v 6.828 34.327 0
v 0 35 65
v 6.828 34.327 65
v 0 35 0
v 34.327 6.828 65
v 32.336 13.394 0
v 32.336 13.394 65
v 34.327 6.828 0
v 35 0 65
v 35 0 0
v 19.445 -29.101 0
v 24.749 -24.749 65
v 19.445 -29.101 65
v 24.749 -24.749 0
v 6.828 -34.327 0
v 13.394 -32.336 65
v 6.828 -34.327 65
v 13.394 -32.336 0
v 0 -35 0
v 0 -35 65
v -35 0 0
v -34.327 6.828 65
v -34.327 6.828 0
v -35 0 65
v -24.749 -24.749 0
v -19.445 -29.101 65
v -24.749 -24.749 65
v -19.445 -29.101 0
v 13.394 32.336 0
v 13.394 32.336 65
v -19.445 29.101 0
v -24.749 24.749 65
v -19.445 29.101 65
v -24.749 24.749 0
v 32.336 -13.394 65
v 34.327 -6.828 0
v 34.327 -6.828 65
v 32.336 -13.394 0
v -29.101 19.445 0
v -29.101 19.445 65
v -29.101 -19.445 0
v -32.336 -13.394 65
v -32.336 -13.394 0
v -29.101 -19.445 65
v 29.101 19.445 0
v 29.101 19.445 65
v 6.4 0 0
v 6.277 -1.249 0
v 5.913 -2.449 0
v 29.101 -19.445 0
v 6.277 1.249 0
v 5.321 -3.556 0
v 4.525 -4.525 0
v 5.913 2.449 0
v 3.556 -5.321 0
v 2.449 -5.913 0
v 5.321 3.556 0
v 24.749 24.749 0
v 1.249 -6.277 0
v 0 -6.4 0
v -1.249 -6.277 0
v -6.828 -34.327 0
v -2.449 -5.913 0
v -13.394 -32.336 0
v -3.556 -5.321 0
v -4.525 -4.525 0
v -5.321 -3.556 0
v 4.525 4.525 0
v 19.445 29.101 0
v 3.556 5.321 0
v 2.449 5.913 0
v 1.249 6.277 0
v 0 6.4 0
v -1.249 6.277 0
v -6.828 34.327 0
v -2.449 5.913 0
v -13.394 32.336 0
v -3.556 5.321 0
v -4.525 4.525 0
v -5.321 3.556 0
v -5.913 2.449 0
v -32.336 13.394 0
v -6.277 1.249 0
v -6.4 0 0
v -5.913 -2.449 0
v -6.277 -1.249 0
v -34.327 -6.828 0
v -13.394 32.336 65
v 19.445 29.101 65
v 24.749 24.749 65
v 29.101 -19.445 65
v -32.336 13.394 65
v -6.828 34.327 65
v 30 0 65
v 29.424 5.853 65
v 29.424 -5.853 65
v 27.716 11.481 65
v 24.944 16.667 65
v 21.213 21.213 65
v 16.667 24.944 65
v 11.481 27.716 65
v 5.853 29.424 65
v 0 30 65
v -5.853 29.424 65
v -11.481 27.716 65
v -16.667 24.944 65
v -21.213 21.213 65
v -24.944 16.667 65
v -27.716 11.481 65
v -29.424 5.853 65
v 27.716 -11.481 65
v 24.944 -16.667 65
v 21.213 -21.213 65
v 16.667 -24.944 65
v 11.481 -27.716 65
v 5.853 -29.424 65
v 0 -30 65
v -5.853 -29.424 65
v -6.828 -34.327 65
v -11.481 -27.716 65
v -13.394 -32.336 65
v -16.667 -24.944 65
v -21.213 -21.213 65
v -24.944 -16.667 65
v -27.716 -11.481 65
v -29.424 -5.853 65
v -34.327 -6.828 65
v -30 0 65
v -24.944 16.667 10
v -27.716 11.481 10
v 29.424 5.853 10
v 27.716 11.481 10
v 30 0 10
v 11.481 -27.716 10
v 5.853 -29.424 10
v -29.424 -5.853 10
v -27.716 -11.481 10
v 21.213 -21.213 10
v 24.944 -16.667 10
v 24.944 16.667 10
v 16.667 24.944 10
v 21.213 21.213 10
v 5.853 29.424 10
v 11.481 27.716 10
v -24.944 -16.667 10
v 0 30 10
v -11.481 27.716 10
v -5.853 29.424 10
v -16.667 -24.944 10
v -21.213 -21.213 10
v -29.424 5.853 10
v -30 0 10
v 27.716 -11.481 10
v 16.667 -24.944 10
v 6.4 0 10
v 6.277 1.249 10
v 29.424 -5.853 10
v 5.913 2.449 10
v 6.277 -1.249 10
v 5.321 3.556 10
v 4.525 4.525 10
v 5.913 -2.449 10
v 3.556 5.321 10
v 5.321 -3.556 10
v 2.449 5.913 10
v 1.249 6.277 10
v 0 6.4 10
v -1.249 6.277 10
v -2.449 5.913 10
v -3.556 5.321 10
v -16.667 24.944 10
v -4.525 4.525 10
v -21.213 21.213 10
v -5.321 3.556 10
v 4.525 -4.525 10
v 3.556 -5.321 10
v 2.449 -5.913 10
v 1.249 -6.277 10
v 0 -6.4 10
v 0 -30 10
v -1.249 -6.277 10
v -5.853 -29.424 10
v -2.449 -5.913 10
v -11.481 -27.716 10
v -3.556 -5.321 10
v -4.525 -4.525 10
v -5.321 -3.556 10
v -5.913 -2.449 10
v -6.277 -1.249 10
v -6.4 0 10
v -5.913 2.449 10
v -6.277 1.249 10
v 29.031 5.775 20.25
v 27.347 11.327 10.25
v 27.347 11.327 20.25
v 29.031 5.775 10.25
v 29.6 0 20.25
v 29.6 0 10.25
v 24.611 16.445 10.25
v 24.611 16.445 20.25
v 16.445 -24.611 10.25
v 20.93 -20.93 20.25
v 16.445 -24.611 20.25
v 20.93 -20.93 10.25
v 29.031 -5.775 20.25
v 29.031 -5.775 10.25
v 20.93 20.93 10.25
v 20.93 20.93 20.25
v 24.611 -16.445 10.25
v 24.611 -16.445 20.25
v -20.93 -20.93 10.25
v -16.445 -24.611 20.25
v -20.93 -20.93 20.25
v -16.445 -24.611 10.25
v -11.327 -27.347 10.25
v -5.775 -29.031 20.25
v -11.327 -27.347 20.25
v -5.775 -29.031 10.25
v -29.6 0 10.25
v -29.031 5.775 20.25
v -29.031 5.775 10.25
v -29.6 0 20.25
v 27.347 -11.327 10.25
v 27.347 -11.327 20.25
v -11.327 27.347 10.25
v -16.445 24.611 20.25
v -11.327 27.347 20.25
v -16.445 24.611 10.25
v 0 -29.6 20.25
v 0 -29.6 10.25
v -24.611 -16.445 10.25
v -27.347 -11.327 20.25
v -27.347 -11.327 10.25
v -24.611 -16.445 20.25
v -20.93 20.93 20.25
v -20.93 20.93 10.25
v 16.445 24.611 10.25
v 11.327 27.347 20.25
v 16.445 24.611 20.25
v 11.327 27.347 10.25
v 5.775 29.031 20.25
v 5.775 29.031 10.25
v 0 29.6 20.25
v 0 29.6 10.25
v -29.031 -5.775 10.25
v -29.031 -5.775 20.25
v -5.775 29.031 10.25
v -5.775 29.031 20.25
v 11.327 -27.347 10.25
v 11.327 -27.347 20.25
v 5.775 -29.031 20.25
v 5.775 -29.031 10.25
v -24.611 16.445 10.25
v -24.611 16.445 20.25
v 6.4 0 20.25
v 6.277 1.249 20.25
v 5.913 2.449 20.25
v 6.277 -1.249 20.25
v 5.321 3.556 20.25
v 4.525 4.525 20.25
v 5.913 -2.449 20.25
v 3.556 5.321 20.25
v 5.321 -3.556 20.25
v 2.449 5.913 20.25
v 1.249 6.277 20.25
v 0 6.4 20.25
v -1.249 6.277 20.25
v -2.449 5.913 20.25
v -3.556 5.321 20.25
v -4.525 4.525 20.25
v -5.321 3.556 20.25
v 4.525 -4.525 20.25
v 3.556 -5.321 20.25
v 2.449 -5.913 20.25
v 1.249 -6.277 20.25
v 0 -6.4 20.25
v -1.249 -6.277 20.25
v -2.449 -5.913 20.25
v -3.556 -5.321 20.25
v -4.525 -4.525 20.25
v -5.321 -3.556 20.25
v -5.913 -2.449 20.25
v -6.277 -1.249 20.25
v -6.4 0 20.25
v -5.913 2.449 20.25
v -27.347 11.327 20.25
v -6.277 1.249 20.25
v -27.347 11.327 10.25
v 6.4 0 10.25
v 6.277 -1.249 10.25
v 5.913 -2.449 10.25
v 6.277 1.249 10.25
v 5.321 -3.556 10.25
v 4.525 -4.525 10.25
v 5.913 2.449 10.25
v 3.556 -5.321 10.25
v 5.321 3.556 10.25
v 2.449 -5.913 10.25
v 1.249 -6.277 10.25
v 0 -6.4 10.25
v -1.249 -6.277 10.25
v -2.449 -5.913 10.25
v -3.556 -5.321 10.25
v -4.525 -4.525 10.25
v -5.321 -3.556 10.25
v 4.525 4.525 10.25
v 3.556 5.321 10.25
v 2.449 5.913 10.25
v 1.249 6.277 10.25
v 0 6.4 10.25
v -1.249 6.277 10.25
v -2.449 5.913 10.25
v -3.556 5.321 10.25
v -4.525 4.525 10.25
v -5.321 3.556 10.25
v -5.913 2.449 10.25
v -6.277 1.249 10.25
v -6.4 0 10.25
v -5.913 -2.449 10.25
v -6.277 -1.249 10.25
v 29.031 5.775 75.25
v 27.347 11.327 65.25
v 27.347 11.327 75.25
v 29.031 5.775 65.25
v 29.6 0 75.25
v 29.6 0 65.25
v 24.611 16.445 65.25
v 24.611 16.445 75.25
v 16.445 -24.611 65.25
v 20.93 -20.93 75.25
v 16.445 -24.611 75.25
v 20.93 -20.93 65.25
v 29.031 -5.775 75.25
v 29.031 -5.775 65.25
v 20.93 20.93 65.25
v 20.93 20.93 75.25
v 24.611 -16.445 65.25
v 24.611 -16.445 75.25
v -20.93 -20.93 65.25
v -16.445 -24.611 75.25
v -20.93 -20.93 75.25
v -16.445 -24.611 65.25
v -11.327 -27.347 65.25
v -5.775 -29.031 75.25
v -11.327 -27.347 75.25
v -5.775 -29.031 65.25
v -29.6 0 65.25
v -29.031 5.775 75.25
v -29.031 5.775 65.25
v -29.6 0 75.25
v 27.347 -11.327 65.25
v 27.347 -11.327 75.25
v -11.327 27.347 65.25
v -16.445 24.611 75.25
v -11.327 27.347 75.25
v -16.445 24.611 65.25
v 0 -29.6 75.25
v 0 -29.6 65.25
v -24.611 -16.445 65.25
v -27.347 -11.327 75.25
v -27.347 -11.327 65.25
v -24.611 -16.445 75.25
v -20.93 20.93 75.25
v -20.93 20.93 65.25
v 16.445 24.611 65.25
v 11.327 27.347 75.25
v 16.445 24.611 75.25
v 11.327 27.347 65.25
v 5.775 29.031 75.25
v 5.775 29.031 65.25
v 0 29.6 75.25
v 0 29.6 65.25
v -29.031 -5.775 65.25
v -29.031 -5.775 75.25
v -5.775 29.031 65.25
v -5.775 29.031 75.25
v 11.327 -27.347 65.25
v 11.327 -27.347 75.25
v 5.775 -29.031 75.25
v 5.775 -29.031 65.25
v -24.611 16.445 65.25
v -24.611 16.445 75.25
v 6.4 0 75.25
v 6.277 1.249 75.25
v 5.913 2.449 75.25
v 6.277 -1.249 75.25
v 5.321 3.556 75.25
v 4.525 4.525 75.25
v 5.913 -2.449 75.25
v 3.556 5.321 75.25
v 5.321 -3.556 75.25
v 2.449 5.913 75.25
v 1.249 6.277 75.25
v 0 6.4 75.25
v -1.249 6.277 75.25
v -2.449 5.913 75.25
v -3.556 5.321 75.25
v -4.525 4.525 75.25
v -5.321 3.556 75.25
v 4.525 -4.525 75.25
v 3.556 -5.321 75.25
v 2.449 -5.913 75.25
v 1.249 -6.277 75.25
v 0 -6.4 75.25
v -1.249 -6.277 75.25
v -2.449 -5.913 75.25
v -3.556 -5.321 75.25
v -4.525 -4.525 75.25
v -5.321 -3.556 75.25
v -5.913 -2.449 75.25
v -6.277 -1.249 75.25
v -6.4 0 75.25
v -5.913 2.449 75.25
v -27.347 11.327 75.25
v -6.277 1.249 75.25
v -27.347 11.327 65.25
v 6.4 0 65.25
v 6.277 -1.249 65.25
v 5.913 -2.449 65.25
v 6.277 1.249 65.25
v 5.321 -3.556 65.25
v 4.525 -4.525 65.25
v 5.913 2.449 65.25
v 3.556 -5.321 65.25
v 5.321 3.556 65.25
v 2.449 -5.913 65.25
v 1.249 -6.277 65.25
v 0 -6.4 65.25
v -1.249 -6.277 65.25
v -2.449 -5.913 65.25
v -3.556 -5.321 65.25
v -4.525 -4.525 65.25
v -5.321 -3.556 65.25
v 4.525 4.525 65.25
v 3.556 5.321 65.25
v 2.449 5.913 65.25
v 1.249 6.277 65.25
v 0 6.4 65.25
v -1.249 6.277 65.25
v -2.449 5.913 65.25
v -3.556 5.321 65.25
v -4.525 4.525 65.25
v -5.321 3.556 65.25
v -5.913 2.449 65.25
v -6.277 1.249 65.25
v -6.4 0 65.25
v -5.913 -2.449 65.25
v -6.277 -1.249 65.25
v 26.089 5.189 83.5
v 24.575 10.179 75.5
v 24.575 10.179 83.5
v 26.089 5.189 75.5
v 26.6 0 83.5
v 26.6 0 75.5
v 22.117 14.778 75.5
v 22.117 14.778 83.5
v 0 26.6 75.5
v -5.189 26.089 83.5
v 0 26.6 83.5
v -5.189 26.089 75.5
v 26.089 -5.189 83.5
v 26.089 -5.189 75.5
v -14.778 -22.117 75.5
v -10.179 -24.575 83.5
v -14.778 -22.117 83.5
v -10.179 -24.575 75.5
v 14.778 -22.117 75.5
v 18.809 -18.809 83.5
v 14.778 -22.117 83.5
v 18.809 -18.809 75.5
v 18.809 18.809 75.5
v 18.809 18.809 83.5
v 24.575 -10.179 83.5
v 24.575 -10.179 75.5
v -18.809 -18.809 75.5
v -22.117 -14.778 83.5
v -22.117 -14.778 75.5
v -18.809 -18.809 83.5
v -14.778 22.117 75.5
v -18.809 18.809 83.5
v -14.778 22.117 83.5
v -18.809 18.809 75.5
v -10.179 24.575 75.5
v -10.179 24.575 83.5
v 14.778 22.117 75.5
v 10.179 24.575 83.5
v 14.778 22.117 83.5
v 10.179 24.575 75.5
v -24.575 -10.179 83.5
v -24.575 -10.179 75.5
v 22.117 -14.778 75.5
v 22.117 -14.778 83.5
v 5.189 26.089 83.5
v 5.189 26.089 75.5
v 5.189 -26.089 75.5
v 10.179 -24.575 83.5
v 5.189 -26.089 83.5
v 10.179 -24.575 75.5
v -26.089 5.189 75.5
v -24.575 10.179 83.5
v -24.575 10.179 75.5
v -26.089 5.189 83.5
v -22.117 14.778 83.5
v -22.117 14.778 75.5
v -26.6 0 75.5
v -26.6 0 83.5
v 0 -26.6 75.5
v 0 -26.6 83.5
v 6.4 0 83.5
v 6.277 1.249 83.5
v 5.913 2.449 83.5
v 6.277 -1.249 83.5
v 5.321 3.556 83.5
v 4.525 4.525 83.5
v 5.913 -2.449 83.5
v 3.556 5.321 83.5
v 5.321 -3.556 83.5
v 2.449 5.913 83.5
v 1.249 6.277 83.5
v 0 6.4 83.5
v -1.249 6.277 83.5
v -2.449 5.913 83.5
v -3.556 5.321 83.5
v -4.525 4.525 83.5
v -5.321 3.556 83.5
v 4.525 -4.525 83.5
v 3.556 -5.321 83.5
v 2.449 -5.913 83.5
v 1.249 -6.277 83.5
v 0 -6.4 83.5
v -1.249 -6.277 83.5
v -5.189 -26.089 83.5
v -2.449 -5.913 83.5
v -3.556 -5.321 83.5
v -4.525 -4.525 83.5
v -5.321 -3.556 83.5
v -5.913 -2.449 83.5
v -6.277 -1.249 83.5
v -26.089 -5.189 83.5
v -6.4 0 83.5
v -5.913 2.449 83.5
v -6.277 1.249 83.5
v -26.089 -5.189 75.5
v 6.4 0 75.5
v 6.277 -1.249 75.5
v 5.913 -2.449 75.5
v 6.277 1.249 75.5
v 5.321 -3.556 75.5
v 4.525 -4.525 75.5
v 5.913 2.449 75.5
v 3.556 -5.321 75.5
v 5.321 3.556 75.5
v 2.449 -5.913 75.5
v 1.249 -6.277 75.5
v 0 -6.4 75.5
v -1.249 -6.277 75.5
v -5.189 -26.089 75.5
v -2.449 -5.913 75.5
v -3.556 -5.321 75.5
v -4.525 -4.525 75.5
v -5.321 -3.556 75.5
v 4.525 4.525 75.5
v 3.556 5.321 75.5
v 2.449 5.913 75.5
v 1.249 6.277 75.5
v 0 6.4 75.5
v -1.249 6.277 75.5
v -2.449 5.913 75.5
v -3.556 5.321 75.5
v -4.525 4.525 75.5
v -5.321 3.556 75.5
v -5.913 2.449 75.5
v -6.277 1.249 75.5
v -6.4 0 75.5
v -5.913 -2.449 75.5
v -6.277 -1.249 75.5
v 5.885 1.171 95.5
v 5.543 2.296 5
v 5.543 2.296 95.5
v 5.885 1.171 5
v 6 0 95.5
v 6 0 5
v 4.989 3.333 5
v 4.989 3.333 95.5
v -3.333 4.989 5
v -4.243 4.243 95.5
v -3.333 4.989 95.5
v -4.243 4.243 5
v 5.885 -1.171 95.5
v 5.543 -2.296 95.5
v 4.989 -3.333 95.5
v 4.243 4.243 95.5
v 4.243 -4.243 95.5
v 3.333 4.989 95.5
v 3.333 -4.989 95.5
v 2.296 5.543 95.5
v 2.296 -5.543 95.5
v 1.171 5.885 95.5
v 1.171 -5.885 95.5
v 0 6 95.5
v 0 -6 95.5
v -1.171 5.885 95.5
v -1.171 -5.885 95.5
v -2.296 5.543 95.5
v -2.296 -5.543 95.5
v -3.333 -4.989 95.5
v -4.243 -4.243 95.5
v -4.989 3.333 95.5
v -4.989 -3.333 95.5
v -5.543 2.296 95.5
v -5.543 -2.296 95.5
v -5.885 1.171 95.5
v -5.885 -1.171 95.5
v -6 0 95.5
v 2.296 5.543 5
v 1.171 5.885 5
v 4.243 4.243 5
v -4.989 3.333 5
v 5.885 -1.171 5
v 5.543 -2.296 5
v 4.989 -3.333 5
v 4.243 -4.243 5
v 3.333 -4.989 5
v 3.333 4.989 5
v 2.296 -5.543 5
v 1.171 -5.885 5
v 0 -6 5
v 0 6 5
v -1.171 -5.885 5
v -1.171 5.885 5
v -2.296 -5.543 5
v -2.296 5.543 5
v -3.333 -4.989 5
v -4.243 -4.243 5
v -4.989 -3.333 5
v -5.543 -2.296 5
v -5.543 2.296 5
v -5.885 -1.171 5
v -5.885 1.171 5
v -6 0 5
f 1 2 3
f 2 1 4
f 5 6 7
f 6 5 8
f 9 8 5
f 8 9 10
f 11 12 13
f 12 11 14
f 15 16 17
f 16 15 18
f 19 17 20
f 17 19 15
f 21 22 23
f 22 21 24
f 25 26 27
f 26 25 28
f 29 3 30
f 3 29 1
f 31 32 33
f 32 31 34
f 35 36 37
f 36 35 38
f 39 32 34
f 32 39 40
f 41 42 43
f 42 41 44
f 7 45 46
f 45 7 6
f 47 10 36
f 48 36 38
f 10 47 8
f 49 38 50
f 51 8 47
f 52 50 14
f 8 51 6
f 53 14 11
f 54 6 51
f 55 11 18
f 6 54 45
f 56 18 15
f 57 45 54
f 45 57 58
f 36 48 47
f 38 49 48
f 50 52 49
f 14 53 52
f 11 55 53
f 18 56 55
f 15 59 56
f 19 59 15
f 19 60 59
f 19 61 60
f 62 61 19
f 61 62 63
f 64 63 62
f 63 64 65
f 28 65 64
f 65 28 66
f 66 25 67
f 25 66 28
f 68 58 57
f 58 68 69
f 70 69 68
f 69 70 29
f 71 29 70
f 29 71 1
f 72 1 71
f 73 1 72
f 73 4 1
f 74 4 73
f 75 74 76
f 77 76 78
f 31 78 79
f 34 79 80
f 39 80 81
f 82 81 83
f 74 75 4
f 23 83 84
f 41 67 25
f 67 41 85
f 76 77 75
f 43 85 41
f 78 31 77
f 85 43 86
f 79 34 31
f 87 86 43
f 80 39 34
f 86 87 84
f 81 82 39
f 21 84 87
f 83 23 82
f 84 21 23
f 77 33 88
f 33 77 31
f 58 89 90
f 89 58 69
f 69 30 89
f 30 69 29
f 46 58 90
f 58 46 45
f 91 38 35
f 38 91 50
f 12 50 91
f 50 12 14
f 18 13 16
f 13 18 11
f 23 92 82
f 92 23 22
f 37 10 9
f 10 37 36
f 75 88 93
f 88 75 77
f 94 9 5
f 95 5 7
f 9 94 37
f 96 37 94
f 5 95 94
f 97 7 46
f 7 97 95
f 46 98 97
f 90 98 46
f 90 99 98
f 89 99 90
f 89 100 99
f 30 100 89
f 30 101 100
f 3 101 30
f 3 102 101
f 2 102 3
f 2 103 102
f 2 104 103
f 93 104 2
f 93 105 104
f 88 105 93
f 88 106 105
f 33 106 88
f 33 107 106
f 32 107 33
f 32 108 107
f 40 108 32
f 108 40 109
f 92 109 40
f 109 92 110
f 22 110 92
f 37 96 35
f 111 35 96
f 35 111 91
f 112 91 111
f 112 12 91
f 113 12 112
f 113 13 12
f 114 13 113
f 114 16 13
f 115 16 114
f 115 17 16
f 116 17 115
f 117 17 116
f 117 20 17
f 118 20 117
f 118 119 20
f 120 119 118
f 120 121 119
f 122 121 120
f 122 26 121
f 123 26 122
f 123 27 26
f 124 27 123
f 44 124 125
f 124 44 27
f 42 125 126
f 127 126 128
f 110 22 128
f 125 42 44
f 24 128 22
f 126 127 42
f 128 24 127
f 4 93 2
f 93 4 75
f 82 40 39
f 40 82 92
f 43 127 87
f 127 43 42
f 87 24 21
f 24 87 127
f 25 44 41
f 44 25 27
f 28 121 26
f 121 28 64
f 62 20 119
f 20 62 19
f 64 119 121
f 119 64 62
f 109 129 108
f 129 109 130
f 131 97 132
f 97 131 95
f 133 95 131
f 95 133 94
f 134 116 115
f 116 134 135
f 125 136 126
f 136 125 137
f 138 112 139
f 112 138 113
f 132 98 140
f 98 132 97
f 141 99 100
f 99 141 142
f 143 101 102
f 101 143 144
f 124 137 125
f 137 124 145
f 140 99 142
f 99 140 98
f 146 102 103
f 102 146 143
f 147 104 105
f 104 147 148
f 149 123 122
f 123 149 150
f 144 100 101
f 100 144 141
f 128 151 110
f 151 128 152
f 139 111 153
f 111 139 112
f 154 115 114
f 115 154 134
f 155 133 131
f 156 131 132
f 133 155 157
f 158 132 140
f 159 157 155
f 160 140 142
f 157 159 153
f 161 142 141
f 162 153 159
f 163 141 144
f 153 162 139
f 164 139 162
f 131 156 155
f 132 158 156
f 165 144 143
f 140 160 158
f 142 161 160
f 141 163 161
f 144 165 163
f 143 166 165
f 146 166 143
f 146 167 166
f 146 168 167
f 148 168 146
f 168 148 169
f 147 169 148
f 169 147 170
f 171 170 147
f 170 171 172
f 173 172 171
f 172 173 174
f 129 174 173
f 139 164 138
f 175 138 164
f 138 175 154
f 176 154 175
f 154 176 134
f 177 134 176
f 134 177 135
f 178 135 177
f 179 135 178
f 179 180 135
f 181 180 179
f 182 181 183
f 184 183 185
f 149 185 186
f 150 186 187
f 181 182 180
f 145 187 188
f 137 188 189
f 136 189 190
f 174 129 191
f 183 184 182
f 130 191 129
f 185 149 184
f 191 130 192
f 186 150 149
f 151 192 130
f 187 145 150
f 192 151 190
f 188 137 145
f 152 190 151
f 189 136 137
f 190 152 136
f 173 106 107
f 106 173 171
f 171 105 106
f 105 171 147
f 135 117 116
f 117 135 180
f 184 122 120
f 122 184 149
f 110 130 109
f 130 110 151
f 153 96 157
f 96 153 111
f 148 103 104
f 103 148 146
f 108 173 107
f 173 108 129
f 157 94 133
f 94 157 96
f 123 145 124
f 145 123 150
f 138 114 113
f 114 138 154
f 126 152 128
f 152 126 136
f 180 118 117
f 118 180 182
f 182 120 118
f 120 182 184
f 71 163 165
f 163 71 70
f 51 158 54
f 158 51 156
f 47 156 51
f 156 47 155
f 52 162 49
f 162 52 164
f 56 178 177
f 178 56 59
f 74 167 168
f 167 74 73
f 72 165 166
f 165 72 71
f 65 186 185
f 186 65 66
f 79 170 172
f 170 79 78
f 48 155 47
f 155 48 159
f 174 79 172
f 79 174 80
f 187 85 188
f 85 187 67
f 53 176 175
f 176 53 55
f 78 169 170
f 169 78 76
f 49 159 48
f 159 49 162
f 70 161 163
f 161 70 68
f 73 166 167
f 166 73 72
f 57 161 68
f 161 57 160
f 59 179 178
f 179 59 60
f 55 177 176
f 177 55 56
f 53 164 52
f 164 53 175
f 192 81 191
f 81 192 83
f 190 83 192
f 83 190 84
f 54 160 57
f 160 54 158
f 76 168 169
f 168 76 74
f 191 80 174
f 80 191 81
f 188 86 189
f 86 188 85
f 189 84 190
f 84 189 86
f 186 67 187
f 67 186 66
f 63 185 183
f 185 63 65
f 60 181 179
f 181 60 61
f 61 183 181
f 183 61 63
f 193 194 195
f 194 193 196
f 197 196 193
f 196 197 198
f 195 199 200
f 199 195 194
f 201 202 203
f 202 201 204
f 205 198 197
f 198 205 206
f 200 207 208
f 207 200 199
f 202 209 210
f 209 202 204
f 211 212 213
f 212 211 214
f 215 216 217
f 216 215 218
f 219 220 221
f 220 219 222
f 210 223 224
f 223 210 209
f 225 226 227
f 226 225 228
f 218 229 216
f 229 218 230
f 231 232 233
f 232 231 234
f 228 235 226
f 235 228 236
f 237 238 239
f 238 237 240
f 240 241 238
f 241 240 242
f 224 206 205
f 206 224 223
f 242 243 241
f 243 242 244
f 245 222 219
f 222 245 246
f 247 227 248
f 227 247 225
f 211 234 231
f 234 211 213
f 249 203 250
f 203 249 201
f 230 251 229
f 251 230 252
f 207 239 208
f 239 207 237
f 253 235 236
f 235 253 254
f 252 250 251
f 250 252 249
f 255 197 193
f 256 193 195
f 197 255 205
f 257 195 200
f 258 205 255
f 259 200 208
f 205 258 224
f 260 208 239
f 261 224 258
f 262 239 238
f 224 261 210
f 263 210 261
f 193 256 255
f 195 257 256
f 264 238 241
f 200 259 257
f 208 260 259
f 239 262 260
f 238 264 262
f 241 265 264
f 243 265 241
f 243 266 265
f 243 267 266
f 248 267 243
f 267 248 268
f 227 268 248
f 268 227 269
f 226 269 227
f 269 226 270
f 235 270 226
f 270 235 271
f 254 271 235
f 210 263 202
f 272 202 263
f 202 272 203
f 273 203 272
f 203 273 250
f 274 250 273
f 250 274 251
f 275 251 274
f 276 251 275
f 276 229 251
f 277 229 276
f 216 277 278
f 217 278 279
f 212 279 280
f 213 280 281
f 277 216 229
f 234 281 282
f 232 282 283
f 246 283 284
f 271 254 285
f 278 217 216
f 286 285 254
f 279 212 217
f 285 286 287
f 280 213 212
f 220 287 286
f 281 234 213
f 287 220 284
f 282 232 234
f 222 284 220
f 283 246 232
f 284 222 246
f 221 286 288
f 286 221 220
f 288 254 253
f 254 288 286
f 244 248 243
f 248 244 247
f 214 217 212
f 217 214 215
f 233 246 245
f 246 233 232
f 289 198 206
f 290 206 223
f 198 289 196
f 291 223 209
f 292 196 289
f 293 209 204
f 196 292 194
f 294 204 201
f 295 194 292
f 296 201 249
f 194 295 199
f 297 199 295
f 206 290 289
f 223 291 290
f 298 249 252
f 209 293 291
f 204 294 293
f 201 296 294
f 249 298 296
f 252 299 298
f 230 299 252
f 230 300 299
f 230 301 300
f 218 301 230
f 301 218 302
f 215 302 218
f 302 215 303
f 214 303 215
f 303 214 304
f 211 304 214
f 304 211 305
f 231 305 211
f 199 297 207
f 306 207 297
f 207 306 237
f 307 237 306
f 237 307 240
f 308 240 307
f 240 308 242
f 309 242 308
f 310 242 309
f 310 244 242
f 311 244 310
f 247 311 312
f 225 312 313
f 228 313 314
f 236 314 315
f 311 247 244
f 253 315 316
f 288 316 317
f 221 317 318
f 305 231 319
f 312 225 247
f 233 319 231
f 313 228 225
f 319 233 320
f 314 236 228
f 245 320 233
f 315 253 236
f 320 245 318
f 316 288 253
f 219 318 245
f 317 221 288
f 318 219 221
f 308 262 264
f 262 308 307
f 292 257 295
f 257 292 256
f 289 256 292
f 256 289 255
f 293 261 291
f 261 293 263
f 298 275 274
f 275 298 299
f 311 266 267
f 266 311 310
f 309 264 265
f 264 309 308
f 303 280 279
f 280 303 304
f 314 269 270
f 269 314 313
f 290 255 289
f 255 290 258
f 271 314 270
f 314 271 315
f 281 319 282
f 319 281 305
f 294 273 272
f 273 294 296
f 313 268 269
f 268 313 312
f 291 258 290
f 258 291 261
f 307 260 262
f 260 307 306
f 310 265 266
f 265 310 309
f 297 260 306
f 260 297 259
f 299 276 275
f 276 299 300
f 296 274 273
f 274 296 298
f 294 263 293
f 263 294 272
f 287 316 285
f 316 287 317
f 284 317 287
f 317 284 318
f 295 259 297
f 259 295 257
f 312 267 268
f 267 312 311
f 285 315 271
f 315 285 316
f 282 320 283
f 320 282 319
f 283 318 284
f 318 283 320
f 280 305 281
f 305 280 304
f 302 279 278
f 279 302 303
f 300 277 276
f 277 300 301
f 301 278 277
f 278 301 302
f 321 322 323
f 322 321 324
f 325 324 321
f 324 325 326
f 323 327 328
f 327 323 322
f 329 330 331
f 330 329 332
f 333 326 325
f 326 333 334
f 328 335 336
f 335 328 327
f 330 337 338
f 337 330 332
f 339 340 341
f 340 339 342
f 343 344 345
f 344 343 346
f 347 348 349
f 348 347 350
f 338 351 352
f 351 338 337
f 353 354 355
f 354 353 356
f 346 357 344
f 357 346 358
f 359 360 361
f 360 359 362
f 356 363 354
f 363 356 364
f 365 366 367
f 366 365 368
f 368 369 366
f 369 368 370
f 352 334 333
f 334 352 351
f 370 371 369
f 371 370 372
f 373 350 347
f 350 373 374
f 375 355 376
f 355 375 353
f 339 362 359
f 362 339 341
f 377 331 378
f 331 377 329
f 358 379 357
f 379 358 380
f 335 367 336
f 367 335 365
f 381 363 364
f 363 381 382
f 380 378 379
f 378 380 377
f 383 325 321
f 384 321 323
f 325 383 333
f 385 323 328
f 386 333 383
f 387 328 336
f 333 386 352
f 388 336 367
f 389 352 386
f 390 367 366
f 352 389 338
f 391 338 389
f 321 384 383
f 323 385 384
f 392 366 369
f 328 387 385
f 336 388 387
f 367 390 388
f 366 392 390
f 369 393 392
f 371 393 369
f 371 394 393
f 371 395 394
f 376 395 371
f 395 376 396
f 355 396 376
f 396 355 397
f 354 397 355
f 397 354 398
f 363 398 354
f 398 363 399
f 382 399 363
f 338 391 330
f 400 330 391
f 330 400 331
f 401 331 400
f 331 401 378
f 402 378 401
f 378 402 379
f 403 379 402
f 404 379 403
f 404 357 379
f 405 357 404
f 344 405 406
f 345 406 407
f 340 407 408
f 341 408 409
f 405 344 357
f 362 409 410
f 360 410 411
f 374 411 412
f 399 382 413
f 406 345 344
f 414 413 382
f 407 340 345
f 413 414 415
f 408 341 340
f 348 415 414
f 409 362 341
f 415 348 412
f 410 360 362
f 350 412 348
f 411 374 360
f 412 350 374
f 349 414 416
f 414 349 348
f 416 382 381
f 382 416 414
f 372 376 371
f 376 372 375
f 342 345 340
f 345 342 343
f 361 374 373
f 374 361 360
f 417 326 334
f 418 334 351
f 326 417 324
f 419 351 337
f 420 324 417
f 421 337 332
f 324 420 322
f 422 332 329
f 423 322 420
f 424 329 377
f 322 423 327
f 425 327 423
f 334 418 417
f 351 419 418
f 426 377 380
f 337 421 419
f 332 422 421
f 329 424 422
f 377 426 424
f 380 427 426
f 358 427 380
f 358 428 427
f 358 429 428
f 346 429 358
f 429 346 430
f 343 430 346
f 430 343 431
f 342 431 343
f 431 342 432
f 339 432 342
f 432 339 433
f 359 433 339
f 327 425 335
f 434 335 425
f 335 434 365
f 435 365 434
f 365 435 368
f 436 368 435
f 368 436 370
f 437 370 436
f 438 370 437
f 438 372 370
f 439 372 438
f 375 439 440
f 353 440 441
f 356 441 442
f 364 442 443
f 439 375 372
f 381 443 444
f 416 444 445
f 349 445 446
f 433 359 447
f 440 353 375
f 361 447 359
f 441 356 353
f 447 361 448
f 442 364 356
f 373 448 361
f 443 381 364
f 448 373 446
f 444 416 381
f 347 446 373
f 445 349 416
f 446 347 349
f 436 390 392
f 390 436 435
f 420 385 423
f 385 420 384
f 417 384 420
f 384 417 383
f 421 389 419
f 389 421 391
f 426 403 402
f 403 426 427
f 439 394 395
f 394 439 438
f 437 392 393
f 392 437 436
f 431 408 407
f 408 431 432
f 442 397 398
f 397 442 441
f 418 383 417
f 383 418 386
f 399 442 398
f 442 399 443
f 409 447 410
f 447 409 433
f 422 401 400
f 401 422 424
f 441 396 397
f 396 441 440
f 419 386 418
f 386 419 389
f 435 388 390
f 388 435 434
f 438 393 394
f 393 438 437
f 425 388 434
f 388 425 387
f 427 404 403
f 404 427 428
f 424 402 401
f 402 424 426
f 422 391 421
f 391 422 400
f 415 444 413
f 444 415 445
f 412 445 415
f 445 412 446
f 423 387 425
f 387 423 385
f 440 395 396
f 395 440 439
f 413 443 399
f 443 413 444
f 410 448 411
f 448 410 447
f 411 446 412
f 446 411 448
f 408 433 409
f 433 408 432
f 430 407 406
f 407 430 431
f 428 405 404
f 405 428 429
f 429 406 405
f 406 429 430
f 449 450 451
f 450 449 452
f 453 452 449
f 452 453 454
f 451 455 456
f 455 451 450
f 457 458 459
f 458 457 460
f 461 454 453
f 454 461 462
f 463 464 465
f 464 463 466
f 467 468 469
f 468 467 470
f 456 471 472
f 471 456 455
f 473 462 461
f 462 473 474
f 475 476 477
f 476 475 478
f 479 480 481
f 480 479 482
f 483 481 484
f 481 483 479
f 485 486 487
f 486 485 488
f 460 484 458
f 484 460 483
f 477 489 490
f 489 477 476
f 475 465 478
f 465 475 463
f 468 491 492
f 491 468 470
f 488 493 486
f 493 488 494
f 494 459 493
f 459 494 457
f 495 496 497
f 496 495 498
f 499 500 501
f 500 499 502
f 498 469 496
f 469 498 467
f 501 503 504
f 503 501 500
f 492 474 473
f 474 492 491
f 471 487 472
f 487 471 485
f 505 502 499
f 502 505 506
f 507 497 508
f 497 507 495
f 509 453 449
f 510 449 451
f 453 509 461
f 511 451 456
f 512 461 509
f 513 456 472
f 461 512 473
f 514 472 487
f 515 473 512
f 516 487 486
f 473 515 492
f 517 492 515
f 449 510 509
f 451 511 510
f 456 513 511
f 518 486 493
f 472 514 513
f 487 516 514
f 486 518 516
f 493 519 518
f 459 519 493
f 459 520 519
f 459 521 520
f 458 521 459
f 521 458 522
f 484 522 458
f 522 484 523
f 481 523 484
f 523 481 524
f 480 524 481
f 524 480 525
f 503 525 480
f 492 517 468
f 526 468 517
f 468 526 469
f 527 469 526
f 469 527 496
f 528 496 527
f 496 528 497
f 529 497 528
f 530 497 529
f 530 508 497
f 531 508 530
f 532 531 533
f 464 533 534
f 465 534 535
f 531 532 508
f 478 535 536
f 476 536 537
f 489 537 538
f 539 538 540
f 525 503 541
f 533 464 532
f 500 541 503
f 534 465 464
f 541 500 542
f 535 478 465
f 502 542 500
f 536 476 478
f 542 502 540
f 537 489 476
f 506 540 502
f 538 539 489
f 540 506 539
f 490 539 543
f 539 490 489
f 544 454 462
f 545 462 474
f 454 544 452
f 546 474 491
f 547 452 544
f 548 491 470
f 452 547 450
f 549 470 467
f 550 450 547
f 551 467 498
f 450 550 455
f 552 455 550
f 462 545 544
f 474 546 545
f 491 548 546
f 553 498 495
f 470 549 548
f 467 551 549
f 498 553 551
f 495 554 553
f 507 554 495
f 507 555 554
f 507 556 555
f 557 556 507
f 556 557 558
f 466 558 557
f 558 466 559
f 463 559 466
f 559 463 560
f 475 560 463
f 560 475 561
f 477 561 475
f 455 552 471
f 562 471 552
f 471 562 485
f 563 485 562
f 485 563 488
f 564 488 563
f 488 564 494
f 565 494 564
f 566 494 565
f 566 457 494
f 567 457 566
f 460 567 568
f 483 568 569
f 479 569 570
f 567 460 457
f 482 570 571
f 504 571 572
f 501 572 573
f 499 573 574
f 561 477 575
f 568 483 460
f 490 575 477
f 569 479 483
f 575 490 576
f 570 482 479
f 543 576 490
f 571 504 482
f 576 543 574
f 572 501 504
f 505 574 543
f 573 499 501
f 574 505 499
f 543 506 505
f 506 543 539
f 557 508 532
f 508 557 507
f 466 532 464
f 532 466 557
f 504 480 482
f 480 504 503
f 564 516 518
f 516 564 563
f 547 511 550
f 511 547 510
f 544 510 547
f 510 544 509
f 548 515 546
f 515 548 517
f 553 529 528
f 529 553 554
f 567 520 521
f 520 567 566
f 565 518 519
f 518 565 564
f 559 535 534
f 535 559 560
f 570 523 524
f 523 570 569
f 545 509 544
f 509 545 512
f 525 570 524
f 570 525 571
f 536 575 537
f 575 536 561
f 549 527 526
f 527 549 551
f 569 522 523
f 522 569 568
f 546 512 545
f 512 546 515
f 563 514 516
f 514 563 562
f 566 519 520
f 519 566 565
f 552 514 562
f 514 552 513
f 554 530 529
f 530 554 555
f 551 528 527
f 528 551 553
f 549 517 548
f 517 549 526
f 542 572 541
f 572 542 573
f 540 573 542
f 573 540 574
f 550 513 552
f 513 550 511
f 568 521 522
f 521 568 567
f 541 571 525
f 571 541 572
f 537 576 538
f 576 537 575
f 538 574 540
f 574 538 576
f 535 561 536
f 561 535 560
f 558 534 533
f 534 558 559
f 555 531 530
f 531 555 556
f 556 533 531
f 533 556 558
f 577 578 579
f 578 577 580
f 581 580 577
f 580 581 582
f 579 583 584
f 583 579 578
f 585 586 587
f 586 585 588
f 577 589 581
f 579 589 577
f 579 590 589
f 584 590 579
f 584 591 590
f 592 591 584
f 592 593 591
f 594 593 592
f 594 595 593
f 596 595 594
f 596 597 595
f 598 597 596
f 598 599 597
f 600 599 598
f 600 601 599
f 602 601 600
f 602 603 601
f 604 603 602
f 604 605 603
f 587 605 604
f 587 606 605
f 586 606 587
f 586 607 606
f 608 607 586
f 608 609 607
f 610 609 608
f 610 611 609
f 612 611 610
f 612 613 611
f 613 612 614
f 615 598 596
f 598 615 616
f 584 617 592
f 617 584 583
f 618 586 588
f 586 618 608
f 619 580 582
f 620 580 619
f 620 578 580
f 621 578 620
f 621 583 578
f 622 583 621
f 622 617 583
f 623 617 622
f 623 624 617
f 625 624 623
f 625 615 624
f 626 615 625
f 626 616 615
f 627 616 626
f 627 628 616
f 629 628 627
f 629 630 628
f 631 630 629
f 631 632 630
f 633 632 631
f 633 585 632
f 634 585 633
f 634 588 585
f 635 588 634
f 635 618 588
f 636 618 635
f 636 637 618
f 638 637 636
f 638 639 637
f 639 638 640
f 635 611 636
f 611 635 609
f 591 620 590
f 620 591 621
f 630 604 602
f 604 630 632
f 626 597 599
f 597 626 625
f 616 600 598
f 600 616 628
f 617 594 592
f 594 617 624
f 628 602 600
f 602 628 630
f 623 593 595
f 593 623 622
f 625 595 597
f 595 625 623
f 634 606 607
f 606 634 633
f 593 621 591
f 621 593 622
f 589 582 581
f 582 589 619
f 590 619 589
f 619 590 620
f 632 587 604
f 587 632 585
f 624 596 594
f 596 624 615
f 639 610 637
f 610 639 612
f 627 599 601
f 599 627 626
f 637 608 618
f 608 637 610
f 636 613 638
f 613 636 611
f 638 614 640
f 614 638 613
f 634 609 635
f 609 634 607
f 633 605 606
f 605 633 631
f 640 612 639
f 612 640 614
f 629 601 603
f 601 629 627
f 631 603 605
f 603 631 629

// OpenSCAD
$fn = 32;

// ------------------------------------------------------------------------
// Bearing housing: housing d70, two bearings and a shaft
// Every part is its own module, assembly() places them once.
// ------------------------------------------------------------------------

// --- part 1 ---
module housing() {
  difference() {
    cylinder(h = 65, d = 70);
    translate([0, 0, 10]) cylinder(h = 56, d = 60);
    translate([0, 0, -1]) cylinder(h = 12, d = 12.8);
  }
}

// --- part 2 ---
module bearing_lower() {
  difference() {
      translate([0, 0, 0]) cylinder(h = 10, d = 59.2);
      translate([0, 0, -1]) cylinder(h = 12, d = 12.8);
    }
}

// --- part 3 ---
module bearing_upper() {
  difference() {
      translate([0, 0, 0]) cylinder(h = 10, d = 59.2);
      translate([0, 0, -1]) cylinder(h = 12, d = 12.8);
    }
}

// --- part 4 ---
module spacer() {
  difference() {
      translate([0, 0, 0]) cylinder(h = 8, d = 53.2);
      translate([0, 0, -1]) cylinder(h = 10, d = 12.8);
    }
}

// --- part 5 ---
module shaft() {
  translate([0, 0, -45.25]) cylinder(h = 90.5, d = 12);
}

// --- assembly ---
module assembly() {
  translate([0, 0, 0]) rotate([0, 0, 0]) housing();
  translate([0, 0, 10.25]) rotate([0, 0, 0]) bearing_lower();
  translate([0, 0, 65.25]) rotate([0, 0, 0]) bearing_upper();
  translate([0, 0, 75.5]) rotate([0, 0, 0]) spacer();
  translate([0, 0, 50.25]) rotate([0, 0, 0]) shaft();
}

assembly();
